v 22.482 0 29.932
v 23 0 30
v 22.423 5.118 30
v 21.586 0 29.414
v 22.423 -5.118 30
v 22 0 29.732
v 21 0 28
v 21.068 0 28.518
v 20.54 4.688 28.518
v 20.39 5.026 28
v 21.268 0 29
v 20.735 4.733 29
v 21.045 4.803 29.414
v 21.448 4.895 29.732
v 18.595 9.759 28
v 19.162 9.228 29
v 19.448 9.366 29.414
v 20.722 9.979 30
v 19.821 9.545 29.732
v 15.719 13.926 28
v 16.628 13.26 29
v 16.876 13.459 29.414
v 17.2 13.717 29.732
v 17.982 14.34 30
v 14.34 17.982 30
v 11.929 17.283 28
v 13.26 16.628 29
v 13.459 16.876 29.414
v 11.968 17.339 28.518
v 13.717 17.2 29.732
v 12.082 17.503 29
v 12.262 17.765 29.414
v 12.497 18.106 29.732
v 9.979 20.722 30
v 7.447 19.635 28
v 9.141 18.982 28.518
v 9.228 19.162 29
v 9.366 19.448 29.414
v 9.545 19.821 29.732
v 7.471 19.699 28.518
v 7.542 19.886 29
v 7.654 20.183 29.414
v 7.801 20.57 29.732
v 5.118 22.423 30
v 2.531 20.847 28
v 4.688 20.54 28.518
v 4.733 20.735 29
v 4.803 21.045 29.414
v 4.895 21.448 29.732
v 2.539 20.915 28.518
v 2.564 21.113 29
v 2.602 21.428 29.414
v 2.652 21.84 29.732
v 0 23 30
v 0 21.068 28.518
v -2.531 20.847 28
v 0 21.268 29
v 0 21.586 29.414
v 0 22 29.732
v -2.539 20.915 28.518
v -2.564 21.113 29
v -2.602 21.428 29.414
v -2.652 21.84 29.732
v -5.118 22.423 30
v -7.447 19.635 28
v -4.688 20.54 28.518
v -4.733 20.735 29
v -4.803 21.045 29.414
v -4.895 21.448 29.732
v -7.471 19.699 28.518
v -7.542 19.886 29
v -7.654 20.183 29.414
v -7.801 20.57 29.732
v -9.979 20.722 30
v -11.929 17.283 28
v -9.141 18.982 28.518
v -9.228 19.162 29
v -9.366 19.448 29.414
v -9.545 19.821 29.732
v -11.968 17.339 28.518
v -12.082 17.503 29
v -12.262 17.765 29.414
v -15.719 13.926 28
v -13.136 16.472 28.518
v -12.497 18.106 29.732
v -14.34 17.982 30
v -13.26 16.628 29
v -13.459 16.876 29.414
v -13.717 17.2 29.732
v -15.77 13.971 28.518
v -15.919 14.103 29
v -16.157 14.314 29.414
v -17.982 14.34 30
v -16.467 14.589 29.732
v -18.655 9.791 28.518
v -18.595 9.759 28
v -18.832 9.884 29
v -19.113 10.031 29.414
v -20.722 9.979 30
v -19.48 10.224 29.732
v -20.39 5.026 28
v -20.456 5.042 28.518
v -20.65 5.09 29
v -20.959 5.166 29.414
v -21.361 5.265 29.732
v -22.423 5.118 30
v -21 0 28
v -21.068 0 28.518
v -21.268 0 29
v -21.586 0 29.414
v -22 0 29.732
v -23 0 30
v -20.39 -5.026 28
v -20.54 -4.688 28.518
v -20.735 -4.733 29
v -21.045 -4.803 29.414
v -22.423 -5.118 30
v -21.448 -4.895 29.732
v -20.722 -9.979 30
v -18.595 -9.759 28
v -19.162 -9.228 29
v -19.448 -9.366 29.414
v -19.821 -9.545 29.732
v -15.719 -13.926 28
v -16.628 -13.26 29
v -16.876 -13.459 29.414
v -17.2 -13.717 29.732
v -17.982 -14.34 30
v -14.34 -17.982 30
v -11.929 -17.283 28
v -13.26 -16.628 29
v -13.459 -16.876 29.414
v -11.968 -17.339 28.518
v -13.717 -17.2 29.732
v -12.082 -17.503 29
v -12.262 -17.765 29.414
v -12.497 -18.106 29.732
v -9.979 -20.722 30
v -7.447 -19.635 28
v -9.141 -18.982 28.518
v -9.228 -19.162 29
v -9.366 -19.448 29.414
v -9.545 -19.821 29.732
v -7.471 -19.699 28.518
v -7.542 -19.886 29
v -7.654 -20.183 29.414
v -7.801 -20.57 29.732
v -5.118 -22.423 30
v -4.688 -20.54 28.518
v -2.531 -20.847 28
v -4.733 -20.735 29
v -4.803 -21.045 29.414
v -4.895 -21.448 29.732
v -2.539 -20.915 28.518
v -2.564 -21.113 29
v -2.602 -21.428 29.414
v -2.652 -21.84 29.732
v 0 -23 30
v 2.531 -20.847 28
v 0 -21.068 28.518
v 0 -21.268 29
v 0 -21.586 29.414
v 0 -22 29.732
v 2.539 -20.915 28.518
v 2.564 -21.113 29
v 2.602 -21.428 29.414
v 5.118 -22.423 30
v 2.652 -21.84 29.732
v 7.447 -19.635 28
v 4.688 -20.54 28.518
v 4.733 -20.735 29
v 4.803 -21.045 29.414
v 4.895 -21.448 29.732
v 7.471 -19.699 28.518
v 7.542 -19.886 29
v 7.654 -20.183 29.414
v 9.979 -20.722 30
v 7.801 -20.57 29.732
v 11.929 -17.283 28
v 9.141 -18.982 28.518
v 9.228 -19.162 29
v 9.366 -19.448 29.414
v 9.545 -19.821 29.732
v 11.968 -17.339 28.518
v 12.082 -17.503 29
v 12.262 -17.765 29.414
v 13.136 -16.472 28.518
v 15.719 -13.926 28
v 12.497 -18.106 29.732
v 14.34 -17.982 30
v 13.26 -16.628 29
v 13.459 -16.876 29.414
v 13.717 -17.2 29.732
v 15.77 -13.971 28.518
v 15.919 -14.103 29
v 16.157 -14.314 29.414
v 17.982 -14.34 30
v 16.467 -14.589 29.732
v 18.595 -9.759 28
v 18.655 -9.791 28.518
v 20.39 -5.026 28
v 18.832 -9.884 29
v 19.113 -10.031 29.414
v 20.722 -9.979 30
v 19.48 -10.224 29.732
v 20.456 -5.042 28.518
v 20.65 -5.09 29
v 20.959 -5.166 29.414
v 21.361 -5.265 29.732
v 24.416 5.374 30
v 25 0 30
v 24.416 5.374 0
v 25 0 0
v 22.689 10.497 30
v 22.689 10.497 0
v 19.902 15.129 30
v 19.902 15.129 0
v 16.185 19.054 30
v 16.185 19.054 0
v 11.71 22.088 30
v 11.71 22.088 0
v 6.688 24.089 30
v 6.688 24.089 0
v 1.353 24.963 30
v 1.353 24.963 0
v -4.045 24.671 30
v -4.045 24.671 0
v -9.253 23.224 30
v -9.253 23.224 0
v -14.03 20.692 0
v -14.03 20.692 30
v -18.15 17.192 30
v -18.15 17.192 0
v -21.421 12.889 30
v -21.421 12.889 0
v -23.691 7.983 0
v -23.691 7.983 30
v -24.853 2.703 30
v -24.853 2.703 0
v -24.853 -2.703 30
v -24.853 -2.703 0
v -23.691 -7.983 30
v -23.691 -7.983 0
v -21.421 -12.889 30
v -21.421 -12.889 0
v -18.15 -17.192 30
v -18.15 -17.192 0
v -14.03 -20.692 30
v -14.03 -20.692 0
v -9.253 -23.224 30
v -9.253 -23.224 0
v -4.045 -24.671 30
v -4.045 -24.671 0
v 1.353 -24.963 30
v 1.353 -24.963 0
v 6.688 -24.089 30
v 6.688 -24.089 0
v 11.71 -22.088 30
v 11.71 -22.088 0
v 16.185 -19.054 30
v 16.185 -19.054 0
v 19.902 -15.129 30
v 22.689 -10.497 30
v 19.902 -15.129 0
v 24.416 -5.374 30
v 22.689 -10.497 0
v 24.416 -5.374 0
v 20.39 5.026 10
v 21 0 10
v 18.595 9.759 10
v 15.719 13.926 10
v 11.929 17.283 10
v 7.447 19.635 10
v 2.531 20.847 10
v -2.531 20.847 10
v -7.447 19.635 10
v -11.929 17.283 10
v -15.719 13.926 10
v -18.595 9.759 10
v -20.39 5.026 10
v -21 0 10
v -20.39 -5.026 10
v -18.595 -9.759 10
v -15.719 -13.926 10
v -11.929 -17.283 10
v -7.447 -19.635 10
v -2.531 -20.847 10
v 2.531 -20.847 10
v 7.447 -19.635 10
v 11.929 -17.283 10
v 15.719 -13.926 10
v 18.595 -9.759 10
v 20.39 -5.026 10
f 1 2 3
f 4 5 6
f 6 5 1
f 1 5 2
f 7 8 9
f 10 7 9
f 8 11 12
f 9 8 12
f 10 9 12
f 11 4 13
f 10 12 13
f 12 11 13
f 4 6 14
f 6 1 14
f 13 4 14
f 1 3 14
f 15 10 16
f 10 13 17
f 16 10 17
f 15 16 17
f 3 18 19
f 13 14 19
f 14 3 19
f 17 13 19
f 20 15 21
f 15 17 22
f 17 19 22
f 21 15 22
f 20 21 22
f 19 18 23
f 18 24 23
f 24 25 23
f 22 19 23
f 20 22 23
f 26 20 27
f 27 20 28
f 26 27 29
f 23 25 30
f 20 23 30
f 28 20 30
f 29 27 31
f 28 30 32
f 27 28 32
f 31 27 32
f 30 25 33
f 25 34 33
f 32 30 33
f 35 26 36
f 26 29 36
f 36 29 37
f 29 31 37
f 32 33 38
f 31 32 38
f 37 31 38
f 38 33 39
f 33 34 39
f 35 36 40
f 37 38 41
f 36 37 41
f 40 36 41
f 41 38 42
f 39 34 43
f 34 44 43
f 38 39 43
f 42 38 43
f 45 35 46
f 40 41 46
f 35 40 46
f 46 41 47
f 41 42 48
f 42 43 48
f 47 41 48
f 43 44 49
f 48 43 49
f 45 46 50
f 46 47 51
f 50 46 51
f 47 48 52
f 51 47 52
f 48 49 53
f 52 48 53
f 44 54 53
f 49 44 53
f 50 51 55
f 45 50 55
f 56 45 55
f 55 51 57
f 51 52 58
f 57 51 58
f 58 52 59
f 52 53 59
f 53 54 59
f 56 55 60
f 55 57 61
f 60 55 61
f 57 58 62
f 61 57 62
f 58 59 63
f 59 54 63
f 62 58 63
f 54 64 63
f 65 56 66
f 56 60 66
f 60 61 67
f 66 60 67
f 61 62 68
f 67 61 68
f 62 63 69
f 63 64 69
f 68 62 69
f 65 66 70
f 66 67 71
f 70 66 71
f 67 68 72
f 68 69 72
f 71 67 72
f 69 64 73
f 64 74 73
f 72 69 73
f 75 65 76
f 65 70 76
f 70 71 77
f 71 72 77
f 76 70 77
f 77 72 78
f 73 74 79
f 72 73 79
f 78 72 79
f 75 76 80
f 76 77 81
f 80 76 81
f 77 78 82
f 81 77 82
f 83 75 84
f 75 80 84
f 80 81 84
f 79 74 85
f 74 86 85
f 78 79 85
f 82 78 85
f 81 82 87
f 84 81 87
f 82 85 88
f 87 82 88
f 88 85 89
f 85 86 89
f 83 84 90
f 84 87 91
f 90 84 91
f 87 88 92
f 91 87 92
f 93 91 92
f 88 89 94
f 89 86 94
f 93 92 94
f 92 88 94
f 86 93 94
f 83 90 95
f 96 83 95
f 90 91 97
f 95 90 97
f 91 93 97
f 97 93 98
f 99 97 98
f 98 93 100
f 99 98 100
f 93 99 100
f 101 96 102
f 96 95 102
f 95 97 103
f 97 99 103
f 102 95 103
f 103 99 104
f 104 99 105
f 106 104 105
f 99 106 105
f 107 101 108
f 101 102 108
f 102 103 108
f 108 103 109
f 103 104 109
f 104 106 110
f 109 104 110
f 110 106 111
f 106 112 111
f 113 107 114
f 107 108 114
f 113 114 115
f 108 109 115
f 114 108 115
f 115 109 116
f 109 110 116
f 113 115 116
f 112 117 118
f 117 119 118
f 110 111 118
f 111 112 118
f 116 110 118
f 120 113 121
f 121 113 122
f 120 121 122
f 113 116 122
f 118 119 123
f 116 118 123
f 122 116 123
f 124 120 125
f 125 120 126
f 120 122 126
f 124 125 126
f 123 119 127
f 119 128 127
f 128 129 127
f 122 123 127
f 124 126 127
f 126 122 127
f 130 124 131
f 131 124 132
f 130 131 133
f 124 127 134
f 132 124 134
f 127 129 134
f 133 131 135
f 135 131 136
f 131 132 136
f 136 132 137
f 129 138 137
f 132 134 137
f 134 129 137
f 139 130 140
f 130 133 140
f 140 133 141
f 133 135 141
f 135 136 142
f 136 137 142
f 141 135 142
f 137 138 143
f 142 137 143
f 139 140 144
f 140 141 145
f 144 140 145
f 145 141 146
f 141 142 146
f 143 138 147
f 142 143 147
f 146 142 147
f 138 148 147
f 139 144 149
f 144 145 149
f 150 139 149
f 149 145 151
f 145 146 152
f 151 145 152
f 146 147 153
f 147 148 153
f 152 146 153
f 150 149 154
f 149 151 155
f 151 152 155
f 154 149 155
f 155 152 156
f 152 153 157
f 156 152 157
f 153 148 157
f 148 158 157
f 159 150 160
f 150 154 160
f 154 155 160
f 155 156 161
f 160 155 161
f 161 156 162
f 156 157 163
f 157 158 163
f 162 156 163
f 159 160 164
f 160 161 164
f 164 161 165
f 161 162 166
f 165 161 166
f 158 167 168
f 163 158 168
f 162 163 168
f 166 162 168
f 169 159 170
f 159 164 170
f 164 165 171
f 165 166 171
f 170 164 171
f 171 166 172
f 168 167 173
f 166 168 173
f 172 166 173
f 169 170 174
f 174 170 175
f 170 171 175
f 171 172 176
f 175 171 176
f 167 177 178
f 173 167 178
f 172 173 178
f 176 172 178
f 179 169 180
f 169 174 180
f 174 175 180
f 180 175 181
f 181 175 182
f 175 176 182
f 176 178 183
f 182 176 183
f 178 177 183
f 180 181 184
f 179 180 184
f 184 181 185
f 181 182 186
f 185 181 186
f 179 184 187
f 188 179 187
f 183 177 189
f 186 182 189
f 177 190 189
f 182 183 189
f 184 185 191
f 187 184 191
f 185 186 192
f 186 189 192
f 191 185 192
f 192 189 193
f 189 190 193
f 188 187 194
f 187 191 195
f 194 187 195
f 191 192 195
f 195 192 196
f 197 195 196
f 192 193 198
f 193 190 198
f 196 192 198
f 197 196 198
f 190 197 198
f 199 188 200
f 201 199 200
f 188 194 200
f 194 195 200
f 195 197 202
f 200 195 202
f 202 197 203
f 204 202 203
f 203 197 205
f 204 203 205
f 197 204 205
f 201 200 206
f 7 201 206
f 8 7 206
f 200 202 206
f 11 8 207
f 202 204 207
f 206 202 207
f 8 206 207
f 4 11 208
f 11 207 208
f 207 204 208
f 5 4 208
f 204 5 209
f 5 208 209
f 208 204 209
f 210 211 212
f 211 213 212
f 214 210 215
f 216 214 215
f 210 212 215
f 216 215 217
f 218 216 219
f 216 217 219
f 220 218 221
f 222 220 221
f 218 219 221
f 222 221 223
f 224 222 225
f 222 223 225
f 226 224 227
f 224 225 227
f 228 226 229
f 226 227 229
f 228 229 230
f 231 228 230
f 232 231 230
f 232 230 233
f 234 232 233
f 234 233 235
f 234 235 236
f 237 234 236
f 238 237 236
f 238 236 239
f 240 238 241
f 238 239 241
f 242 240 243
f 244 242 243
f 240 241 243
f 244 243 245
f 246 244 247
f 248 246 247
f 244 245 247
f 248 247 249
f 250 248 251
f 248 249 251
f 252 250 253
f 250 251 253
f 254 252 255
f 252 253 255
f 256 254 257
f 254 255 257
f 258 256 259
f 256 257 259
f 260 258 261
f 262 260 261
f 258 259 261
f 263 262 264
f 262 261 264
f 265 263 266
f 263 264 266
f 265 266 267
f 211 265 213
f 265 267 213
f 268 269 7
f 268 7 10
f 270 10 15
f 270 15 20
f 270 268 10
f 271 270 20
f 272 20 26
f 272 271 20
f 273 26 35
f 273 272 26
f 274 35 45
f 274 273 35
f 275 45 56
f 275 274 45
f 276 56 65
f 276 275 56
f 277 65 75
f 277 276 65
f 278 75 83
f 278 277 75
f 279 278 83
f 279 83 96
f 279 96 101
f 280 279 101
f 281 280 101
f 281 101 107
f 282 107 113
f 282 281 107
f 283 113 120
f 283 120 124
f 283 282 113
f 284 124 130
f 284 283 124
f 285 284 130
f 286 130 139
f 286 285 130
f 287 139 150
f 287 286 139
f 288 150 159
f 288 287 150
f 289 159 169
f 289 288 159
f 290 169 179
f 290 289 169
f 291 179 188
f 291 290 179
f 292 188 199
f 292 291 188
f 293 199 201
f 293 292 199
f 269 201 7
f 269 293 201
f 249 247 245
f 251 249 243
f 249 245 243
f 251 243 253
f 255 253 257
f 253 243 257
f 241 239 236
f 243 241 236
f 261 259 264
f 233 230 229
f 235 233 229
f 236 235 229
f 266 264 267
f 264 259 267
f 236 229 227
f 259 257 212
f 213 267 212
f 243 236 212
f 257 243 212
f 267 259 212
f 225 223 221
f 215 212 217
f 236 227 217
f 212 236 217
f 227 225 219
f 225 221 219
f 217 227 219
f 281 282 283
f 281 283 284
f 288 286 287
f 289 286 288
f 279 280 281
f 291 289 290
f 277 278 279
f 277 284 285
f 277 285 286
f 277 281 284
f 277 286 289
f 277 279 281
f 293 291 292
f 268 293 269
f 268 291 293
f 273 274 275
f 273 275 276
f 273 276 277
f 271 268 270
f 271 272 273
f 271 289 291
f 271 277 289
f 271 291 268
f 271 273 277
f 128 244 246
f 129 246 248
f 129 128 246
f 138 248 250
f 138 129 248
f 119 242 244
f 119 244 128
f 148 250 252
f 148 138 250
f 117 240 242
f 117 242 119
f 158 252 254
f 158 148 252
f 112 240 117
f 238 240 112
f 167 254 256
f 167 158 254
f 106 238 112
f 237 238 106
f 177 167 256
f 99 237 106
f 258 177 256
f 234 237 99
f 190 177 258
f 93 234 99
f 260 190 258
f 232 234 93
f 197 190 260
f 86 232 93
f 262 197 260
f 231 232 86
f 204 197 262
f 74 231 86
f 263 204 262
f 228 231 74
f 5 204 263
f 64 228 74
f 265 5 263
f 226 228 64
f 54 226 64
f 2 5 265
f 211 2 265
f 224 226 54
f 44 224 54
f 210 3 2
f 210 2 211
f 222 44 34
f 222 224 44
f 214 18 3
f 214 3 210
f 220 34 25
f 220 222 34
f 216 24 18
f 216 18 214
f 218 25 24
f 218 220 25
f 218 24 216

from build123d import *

# Parameters (mm, degrees)
TUBE_R         = 25
TUBE_R_2       = 21
TUBE_DEPTH     = 20
FILLET_R       = 2
CYLINDER_R     = 25
CYLINDER_DEPTH = 10


with BuildPart() as fillet_body:
    # Tube → Tube (new body)
    with BuildSketch(Plane.XY.offset(10)):
        Circle(TUBE_R)
        Circle(TUBE_R_2, mode=Mode.SUBTRACT)
    extrude(amount=TUBE_DEPTH)

    # Fillet
    fillet_edges = [fillet_body.edges().sort_by_distance(p)[0] for p in [
        (-21, 0, 30),
    ]]
    fillet(fillet_edges, radius=FILLET_R)


with BuildPart() as fusion:
    # Cylinder → Cylinder (new body)
    with BuildSketch(Plane.XY):
        Circle(CYLINDER_R)
    extrude(amount=CYLINDER_DEPTH)

    # Fusion: union Fillet body
    add(fillet_body.part)


solid = fusion.part
